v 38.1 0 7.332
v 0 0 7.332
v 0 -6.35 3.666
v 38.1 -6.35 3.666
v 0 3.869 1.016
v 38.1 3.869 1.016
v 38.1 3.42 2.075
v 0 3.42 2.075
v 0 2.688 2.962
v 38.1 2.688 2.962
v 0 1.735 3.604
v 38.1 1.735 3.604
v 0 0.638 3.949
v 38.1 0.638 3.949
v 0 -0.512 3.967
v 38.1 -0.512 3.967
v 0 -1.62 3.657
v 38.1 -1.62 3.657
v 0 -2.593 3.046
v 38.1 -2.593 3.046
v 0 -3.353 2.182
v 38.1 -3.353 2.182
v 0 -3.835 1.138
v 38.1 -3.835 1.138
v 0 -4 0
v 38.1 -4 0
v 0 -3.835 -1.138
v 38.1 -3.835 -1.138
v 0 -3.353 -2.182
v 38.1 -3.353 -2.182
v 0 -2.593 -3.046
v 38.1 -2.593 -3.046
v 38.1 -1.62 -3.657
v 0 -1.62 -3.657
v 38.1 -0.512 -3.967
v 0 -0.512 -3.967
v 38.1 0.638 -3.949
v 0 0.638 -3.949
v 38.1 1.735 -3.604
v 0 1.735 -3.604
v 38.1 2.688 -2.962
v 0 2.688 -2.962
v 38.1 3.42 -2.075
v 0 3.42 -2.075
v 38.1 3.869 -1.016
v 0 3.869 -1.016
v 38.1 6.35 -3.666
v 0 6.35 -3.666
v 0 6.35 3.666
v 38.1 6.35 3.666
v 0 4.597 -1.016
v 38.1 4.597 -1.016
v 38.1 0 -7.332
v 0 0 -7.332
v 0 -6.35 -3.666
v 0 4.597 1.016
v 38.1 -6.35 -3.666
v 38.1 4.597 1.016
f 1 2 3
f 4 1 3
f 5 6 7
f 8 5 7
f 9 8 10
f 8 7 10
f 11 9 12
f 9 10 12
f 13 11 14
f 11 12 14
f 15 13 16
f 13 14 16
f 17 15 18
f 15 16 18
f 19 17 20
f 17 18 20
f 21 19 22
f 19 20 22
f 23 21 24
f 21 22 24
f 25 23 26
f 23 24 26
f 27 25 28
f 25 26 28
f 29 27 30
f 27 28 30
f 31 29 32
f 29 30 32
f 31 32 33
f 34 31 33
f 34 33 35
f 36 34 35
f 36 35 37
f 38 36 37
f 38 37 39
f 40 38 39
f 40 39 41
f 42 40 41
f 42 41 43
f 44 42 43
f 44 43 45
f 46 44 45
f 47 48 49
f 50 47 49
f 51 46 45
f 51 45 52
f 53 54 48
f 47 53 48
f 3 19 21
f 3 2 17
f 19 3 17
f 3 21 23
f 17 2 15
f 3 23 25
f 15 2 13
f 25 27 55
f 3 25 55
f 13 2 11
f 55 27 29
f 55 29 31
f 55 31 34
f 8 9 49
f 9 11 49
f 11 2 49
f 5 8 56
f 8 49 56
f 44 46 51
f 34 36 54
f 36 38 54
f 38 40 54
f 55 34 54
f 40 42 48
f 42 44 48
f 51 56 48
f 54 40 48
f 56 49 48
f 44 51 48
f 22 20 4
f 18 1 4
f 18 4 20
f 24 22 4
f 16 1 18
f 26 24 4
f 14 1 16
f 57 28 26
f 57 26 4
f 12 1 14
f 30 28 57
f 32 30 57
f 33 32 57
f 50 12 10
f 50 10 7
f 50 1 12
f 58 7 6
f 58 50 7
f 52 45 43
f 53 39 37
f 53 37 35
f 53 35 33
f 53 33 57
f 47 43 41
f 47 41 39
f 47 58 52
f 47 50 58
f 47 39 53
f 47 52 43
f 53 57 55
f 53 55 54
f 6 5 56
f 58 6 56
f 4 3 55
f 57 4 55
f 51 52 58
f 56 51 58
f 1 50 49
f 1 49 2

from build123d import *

# Parameters (mm, degrees)
BOSS_EXTRUDE1_DEPTH = 38.1
SKETCH2_R           = 4
CUT_EXTRUDE1_DEPTH  = 40.315338398
SKETCH3_W           = 2.032
SKETCH3_H           = 1.1938
CUT_EXTRUDE2_DEPTH  = 40.315338398


with BuildPart() as part:
    # Sketch1 → Boss-Extrude1 (new body)
    with BuildSketch(Plane(origin=(0, 0, 0), x_dir=(0, 0, -1), z_dir=(1, 0, 0))):
        Polygon((7.332348419, 0), (3.666174209, 6.35), (-3.666174209, 6.35), (-7.332348419, 0), (-3.666174209, -6.35), (3.666174209, -6.35), align=None)
    extrude(amount=BOSS_EXTRUDE1_DEPTH)

    # Sketch2 → Cut-Extrude1 (cut, through all)
    with BuildSketch(Plane(origin=(38.1, 0, 0), x_dir=(0, 0, -1), z_dir=(1, 0, 0))):
        Circle(SKETCH2_R)
    extrude(amount=-CUT_EXTRUDE1_DEPTH, mode=Mode.SUBTRACT)

    # Sketch3 → Cut-Extrude2 (cut, through all)
    with BuildSketch(Plane.ZY):
        with Locations((0, 4)):
            Rectangle(SKETCH3_W, SKETCH3_H)
    extrude(amount=-CUT_EXTRUDE2_DEPTH, mode=Mode.SUBTRACT)


solid = part.part
